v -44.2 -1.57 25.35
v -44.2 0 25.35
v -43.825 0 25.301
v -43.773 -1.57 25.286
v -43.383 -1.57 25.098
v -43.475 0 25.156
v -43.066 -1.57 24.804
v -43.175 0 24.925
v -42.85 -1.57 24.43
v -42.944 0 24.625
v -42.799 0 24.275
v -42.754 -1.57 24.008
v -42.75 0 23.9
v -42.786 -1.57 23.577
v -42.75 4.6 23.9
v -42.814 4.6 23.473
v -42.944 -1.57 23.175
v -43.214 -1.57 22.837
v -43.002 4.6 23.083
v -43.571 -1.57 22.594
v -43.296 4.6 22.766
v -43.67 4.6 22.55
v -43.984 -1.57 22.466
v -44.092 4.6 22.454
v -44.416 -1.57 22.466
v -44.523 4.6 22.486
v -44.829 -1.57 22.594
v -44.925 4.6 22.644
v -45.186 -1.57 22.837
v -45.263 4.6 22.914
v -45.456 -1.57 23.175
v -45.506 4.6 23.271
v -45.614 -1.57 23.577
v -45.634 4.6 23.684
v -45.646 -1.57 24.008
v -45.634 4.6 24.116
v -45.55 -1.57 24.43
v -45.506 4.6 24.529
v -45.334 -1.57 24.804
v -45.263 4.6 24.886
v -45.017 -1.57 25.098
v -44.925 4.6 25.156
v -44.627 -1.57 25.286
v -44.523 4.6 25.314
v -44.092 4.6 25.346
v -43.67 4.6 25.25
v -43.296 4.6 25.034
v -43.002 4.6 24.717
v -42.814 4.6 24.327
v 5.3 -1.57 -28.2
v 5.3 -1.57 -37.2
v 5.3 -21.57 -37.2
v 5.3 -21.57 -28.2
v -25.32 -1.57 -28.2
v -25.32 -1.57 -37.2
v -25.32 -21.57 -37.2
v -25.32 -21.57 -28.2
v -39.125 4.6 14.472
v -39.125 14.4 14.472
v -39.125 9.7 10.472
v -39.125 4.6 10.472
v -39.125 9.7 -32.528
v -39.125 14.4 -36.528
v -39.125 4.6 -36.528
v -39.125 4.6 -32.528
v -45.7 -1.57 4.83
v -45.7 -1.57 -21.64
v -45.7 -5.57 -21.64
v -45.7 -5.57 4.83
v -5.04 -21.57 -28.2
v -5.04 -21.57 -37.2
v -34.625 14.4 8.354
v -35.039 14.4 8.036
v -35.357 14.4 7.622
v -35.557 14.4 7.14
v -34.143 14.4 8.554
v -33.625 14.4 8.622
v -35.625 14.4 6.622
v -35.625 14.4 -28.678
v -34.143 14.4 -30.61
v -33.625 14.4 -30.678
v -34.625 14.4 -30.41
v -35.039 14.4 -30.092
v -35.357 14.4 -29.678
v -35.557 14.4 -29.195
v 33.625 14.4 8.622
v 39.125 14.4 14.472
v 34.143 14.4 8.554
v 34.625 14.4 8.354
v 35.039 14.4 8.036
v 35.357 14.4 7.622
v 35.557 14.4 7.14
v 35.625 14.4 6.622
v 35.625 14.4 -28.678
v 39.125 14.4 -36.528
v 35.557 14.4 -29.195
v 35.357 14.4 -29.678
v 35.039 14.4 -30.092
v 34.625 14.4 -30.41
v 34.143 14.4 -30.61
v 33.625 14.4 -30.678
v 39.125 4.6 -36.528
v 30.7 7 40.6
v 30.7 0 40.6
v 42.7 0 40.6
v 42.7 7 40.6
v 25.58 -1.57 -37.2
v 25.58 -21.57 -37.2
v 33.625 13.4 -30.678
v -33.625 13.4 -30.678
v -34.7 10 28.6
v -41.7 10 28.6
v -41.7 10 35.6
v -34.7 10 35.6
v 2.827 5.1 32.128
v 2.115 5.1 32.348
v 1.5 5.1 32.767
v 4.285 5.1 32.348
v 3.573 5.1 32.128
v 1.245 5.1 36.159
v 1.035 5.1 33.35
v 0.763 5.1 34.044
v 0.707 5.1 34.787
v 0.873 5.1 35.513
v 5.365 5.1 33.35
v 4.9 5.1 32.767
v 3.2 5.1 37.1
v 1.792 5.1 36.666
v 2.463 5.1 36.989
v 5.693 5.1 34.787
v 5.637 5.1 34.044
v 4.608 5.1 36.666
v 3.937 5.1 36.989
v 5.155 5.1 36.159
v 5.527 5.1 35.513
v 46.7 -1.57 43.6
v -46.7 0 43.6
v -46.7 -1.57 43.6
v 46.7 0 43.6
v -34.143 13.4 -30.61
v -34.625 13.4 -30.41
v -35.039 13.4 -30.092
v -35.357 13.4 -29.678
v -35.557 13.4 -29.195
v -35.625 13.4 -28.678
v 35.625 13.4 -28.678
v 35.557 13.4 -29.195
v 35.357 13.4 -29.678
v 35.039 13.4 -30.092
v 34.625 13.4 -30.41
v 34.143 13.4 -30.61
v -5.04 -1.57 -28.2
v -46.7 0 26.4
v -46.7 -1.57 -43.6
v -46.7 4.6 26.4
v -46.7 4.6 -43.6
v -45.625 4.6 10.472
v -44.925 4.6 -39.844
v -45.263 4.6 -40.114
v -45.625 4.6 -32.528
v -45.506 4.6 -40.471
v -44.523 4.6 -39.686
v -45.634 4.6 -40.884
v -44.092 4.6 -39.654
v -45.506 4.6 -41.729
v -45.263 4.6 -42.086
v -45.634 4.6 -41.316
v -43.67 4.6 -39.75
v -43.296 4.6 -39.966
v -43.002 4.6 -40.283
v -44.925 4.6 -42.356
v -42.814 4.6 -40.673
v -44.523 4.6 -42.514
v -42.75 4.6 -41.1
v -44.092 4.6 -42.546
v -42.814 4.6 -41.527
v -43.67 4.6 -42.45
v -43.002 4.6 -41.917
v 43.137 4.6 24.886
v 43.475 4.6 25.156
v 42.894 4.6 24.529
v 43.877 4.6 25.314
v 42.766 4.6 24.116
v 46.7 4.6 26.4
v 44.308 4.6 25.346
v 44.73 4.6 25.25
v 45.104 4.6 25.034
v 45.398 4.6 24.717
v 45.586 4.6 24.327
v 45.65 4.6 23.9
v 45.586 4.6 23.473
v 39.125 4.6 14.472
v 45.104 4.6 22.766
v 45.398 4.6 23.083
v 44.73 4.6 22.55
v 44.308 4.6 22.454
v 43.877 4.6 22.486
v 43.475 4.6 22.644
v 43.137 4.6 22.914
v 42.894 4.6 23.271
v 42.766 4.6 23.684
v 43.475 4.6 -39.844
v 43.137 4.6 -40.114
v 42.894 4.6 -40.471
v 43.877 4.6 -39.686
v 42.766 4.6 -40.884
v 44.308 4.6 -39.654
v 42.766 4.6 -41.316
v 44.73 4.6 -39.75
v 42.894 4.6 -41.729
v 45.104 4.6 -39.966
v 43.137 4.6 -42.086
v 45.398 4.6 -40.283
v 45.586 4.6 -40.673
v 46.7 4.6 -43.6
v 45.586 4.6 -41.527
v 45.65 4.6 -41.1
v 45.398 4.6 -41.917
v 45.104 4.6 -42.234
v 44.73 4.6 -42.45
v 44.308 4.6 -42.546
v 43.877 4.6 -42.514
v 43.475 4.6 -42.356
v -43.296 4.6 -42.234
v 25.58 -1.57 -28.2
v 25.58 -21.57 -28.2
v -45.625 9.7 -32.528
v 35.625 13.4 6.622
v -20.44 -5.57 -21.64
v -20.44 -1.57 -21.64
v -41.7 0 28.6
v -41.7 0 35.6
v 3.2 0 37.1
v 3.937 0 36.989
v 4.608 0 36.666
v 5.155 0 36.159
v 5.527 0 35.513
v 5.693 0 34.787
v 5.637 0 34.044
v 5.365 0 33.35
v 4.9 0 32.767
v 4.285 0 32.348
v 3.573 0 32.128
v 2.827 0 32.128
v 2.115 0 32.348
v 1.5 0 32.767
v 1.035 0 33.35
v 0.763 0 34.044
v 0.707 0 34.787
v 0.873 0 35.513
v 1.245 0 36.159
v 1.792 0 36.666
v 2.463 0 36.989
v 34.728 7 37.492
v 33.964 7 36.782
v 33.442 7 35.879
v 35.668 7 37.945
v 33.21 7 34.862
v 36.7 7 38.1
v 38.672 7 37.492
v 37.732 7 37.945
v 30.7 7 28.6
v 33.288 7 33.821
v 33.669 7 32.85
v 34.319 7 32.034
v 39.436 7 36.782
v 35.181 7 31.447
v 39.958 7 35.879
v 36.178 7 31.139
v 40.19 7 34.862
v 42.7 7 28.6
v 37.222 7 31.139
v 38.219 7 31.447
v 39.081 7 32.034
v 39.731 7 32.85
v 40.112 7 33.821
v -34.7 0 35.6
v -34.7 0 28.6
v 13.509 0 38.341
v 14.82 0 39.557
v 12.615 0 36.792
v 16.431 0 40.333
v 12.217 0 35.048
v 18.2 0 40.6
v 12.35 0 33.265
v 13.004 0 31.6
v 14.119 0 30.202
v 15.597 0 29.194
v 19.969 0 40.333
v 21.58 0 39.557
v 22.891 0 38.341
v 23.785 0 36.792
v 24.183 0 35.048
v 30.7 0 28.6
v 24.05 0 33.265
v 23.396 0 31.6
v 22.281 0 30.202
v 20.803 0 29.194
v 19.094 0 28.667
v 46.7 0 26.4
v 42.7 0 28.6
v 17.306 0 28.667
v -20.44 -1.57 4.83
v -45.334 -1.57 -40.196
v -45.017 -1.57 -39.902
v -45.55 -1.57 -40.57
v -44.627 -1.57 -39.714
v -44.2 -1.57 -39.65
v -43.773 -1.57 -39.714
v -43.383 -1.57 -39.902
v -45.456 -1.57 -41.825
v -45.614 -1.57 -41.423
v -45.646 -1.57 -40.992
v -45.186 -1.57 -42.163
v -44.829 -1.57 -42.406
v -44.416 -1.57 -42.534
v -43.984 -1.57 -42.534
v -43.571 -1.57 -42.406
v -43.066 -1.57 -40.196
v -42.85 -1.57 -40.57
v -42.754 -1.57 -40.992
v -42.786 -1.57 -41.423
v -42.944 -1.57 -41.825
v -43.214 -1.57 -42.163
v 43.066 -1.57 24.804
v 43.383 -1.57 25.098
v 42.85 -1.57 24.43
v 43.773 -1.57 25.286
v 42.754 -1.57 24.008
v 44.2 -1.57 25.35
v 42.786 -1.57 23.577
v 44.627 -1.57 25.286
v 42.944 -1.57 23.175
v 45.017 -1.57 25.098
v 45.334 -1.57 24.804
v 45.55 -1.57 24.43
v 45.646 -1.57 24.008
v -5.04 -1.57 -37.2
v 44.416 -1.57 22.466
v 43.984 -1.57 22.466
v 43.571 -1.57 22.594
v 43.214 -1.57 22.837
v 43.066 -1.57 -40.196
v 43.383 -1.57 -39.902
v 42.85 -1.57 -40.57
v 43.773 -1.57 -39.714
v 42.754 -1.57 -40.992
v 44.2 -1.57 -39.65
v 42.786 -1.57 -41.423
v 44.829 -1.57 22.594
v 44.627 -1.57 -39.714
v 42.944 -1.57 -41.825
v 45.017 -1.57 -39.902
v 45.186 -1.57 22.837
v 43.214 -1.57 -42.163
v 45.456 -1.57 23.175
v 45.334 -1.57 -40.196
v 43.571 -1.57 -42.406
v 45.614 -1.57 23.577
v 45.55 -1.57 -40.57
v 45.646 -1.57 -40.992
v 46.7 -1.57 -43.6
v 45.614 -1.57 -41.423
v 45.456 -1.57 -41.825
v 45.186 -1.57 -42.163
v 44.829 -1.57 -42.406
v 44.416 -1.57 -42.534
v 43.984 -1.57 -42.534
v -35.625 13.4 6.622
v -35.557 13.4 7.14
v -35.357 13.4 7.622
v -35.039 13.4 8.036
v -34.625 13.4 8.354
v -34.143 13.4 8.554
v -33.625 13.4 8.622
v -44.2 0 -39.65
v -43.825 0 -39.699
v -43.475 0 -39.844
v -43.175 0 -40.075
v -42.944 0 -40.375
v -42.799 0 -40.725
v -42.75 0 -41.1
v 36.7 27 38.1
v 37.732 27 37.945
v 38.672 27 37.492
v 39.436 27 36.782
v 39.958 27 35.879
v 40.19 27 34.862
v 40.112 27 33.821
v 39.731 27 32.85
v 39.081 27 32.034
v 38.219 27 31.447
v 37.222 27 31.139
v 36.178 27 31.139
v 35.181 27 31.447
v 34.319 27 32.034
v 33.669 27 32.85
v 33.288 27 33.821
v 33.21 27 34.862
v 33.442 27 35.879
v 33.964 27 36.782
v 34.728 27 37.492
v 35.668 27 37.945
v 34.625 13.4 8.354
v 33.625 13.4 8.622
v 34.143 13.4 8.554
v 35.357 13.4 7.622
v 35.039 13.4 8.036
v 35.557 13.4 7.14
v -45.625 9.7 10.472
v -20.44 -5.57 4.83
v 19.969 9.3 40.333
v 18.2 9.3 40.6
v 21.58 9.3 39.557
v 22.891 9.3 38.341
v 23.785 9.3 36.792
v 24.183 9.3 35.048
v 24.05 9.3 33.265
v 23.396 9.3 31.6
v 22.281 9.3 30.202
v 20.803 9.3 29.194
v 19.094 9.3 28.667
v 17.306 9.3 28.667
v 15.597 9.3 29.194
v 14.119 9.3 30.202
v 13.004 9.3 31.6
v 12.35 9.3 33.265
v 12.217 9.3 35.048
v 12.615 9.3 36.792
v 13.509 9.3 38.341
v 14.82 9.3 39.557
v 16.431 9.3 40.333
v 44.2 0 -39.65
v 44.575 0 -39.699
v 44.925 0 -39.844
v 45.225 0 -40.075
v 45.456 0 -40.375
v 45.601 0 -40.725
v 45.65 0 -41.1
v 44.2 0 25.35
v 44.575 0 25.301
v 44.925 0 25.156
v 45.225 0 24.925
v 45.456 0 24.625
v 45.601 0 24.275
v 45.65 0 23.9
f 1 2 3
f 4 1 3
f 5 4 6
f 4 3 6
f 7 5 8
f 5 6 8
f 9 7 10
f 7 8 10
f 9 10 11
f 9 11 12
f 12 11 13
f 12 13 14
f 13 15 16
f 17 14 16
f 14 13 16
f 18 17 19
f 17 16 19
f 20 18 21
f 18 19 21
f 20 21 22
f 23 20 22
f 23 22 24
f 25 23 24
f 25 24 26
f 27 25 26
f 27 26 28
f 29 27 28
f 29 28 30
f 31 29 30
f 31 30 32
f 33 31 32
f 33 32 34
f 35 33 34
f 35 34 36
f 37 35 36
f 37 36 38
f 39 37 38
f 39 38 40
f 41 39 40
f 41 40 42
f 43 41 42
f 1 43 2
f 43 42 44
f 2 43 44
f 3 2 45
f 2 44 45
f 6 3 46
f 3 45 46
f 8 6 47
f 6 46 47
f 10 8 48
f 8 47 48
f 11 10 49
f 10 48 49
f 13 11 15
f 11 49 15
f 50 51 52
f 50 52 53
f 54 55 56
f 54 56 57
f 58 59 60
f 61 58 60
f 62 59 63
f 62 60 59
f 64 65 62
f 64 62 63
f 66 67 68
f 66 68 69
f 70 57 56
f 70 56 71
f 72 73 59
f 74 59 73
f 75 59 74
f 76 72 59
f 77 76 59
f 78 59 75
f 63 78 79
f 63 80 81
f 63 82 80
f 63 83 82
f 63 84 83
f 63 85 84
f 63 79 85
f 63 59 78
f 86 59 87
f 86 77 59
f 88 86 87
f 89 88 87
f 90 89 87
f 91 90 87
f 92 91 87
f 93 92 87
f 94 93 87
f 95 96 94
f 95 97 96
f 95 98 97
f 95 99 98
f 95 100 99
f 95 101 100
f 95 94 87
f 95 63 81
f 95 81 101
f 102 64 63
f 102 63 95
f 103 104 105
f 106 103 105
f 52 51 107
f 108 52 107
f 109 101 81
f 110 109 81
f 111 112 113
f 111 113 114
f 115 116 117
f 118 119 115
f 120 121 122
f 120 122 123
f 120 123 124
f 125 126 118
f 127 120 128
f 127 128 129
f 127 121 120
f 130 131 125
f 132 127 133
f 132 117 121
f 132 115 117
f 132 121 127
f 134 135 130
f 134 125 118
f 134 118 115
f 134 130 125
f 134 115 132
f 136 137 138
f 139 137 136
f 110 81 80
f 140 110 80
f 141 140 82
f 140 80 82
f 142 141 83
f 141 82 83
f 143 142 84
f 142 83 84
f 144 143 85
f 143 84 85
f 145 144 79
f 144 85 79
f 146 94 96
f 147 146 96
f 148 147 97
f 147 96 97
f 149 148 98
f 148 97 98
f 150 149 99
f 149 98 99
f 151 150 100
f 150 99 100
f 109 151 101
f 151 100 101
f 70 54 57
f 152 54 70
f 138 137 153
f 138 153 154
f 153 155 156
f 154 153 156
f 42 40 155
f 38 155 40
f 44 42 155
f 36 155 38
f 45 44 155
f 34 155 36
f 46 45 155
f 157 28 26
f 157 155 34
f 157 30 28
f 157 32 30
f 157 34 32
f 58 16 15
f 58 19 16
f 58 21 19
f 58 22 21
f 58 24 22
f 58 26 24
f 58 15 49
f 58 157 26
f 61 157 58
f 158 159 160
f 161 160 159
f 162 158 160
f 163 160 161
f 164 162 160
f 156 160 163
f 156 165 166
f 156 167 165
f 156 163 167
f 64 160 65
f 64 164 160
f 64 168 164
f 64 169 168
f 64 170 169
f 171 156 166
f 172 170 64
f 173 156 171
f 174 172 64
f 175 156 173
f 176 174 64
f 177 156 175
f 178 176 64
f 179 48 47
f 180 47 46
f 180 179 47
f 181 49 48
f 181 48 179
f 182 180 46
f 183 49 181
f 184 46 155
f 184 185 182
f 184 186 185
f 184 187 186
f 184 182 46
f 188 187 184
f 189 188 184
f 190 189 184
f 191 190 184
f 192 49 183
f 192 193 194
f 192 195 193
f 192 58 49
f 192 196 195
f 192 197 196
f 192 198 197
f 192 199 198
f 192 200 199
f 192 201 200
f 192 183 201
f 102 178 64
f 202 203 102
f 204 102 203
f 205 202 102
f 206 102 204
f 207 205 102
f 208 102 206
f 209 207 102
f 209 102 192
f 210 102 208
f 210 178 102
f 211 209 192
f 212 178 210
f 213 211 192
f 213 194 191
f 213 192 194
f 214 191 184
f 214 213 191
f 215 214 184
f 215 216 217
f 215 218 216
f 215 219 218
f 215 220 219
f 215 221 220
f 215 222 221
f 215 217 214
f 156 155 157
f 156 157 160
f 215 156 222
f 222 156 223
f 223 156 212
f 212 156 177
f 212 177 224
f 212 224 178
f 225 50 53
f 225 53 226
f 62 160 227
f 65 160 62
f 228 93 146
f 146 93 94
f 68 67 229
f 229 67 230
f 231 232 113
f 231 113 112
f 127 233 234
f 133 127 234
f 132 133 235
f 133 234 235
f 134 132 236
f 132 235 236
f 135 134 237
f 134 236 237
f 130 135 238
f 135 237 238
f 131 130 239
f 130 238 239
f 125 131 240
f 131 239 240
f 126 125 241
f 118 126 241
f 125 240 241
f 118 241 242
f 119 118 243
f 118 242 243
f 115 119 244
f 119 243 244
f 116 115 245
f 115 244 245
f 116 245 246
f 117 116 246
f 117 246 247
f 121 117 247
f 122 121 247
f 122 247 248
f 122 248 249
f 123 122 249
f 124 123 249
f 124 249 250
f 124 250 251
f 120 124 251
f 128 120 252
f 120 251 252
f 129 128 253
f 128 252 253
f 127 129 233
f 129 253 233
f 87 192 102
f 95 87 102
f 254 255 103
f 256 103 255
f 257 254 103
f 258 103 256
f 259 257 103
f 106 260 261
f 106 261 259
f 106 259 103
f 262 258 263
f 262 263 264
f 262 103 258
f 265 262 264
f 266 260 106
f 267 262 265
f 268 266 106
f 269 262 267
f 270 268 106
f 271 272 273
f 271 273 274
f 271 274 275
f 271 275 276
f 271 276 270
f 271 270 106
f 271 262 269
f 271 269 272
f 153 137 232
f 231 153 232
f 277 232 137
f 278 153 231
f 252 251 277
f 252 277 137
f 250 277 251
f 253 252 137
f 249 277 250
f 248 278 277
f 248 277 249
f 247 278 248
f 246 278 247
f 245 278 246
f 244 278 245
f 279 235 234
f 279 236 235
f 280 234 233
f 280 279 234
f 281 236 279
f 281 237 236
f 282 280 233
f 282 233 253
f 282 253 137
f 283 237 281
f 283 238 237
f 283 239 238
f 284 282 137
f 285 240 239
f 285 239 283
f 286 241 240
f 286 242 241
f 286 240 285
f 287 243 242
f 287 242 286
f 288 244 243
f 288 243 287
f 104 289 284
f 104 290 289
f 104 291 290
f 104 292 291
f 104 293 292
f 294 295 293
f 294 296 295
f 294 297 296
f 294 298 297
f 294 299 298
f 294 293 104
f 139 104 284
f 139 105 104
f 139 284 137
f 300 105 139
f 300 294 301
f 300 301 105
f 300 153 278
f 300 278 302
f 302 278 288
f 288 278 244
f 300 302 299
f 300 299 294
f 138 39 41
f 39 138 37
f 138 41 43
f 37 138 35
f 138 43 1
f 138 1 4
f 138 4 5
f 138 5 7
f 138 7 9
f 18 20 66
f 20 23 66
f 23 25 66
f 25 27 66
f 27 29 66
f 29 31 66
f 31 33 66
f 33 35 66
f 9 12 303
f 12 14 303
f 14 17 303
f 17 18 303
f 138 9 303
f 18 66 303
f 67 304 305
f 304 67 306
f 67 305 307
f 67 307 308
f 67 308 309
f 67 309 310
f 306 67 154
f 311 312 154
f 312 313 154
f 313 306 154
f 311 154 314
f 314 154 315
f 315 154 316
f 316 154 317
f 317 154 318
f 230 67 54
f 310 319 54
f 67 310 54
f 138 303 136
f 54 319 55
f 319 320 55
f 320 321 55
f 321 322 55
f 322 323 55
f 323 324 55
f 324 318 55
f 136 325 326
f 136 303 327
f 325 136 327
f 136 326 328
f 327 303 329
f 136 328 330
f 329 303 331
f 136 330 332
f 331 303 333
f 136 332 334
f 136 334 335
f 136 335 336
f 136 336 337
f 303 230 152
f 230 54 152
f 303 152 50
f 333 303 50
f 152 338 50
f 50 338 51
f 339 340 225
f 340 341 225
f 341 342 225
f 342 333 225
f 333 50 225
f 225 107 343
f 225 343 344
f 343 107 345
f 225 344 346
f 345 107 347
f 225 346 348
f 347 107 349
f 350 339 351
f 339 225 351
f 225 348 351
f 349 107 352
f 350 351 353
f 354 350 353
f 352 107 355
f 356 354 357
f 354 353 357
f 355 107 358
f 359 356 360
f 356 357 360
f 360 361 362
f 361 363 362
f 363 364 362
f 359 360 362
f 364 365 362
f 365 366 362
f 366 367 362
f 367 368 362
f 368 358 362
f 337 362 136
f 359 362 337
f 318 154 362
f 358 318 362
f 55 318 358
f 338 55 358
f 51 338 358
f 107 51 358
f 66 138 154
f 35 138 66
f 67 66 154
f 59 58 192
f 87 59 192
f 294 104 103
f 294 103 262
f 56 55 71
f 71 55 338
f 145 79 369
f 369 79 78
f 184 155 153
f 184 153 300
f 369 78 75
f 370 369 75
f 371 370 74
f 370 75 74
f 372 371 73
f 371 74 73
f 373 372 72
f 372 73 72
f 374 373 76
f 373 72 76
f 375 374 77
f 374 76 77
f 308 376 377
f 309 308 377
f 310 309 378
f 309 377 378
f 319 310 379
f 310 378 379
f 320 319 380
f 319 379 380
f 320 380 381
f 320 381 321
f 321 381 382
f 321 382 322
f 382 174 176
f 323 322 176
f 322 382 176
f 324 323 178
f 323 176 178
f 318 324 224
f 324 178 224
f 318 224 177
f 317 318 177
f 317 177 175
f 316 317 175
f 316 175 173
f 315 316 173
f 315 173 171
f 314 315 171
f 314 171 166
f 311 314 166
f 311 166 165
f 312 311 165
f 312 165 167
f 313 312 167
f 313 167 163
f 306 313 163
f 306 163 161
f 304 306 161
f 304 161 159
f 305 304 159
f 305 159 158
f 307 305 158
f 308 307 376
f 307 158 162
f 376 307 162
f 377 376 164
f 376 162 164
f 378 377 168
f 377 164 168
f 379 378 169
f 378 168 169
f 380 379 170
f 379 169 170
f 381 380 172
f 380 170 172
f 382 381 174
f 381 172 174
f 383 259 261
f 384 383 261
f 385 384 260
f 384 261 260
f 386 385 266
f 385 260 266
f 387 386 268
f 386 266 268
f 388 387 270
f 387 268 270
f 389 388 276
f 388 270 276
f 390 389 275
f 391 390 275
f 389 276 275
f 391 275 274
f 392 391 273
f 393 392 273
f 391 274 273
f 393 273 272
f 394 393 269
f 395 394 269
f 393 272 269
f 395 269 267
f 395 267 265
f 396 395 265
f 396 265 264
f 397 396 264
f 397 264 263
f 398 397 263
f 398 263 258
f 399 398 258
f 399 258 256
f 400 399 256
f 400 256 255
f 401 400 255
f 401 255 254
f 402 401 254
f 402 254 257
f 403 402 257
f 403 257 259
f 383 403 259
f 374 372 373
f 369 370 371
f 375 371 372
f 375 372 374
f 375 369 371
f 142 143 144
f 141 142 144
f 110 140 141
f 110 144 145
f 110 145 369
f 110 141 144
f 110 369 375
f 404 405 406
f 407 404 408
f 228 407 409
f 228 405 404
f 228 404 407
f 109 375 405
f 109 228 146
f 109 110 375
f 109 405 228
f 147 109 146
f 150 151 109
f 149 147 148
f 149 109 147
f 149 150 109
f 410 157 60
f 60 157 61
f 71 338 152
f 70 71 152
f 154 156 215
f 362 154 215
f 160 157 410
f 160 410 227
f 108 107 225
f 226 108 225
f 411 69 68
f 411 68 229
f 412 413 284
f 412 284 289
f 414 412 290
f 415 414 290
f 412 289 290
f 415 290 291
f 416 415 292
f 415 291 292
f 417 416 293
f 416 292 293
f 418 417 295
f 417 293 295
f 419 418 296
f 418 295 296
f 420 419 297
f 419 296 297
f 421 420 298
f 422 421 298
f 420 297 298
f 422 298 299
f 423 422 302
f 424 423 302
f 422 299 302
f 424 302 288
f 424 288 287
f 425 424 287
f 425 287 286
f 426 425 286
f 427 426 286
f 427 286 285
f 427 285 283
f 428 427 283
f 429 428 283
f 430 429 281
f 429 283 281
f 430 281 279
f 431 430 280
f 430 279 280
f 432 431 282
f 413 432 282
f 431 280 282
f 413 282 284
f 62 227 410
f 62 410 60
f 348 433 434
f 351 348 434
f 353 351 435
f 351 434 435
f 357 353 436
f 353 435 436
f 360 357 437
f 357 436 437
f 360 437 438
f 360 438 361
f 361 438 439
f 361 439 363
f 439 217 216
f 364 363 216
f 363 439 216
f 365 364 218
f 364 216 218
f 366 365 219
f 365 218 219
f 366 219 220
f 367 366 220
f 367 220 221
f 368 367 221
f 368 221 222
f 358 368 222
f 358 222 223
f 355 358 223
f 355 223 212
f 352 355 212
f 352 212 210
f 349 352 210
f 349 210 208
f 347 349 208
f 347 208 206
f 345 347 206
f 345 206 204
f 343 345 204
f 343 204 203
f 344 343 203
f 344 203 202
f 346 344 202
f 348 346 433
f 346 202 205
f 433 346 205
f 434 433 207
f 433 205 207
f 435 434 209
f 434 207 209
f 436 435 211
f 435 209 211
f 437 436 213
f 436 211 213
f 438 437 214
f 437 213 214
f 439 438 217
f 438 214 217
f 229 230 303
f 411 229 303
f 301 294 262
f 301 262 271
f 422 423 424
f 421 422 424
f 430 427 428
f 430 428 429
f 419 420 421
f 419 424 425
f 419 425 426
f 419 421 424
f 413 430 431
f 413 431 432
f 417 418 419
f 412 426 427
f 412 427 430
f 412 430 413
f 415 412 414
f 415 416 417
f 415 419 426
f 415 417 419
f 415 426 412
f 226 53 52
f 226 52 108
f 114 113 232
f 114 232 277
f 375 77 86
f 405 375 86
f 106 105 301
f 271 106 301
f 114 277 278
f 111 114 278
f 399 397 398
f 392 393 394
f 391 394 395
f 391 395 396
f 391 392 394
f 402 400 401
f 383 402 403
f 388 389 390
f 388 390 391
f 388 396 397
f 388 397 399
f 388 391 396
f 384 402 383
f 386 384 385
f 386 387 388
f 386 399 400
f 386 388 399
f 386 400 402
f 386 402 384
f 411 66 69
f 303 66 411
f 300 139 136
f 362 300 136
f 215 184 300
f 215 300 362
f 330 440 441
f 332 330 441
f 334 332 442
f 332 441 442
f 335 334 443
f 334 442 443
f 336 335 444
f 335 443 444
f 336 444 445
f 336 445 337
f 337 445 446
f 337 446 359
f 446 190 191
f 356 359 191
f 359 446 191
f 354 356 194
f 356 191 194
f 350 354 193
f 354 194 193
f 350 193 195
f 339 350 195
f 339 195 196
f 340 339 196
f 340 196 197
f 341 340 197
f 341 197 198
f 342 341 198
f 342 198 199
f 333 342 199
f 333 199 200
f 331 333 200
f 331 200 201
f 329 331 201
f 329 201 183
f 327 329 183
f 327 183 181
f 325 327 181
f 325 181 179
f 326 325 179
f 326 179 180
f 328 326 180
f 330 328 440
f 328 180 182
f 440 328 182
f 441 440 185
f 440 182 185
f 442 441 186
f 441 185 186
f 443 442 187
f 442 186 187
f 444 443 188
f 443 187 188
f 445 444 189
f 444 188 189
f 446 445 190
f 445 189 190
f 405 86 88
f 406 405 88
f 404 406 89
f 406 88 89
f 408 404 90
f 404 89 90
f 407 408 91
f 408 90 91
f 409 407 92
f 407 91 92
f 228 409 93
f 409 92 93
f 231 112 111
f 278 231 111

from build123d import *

# Parameters (mm, degrees)
SKETCH1_W            = 93.4
SKETCH1_H            = 87.2
SKETCH1_R            = 1.45
BOSS_EXTRUDE2_DEPTH  = 1.57
BOSS_EXTRUDE3_START  = 4.6
SKETCH1_3_W          = 93.4
SKETCH1_3_H          = 70
SKETCH1_3_R          = 1.45
BOSS_EXTRUDE3_DEPTH  = 4.6
SKETCH1_4_W          = 78.25
SKETCH1_4_H          = 51
BOSS_EXTRUDE4_DEPTH  = 14.4
SKETCH1_5_W          = 6.5
SKETCH1_5_H          = 43
BOSS_EXTRUDE5_DEPTH  = 9.7
SKETCH1_6_W          = 12
SKETCH1_6_H          = 12
BOSS_EXTRUDE6_DEPTH  = 7
SKETCH1_7_R          = 3.5
BOSS_EXTRUDE7_DEPTH  = 27
SKETCH1_8_R          = 6
BOSS_EXTRUDE8_DEPTH  = 9.3
SKETCH1_9_R          = 2.5
BOSS_EXTRUDE9_DEPTH  = 5.1
SKETCH3_W            = 26.26
SKETCH3_H            = 26.47
BOSS_EXTRUDE10_DEPTH = 4
SKETCH4_W            = 20.28
SKETCH4_H            = 9
BOSS_EXTRUDE11_DEPTH = 20
CUT_EXTRUDE1_DEPTH   = 1
SKETCH6_W            = 26.47
SKETCH6_H            = 4
CUT_EXTRUDE2_DEPTH   = 1
SKETCH7_W            = 7
SKETCH7_H            = 7
BOSS_EXTRUDE12_DEPTH = 10


with BuildPart() as part:
    # Sketch1 → Boss-Extrude2 (new body)
    with BuildSketch(Plane(origin=(0, 0, 0), x_dir=(1, 0, 0), z_dir=(0, 1, 0))):
        Rectangle(SKETCH1_W, SKETCH1_H)
        with Locations((-44.2, -23.9)):
            Circle(SKETCH1_R, mode=Mode.SUBTRACT)
        with Locations((44.2, -23.9)):
            Circle(SKETCH1_R, mode=Mode.SUBTRACT)
        with Locations((-44.2, 41.1)):
            Circle(SKETCH1_R, mode=Mode.SUBTRACT)
        with Locations((44.2, 41.1)):
            Circle(SKETCH1_R, mode=Mode.SUBTRACT)
    extrude(amount=-BOSS_EXTRUDE2_DEPTH)

    # Sketch1<3> → Boss-Extrude3 (add)
    with BuildSketch(Plane(origin=(0, 0, 0), x_dir=(1, 0, 0), z_dir=(0, 1, 0)).offset(BOSS_EXTRUDE3_START)):
        with Locations((0, 8.6)):
            Rectangle(SKETCH1_3_W, SKETCH1_3_H)
        with Locations((-44.2, -23.9)):
            Circle(SKETCH1_3_R, mode=Mode.SUBTRACT)
        with Locations((44.2, -23.9)):
            Circle(SKETCH1_3_R, mode=Mode.SUBTRACT)
        with Locations((-44.2, 41.1)):
            Circle(SKETCH1_3_R, mode=Mode.SUBTRACT)
        with Locations((44.2, 41.1)):
            Circle(SKETCH1_3_R, mode=Mode.SUBTRACT)
    extrude(amount=-BOSS_EXTRUDE3_DEPTH)

    # Sketch1<4> → Boss-Extrude4 (add)
    with BuildSketch(Plane(origin=(0, 0, 0), x_dir=(1, 0, 0), z_dir=(0, 1, 0))):
        with Locations((0, 11.027837259)):
            Rectangle(SKETCH1_4_W, SKETCH1_4_H)
    extrude(amount=BOSS_EXTRUDE4_DEPTH)

    # Sketch1<5> → Boss-Extrude5 (add)
    with BuildSketch(Plane(origin=(0, 0, 0), x_dir=(1, 0, 0), z_dir=(0, 1, 0))):
        with Locations((-42.375, 11.027837259)):
            Rectangle(SKETCH1_5_W, SKETCH1_5_H)
    extrude(amount=BOSS_EXTRUDE5_DEPTH)

    # Sketch1<6> → Boss-Extrude6 (add)
    with BuildSketch(Plane(origin=(0, 0, 0), x_dir=(1, 0, 0), z_dir=(0, 1, 0))):
        with Locations((36.7, -34.6)):
            Rectangle(SKETCH1_6_W, SKETCH1_6_H)
    extrude(amount=BOSS_EXTRUDE6_DEPTH)

    # Sketch1<7> → Boss-Extrude7 (add)
    with BuildSketch(Plane(origin=(0, 0, 0), x_dir=(1, 0, 0), z_dir=(0, 1, 0))):
        with Locations((36.7, -34.6)):
            Circle(SKETCH1_7_R)
    extrude(amount=BOSS_EXTRUDE7_DEPTH)

    # Sketch1<8> → Boss-Extrude8 (add)
    with BuildSketch(Plane(origin=(0, 0, 0), x_dir=(1, 0, 0), z_dir=(0, 1, 0))):
        with Locations((18.2, -34.6)):
            Circle(SKETCH1_8_R)
    extrude(amount=BOSS_EXTRUDE8_DEPTH)

    # Sketch1<9> → Boss-Extrude9 (add)
    with BuildSketch(Plane(origin=(0, 0, 0), x_dir=(1, 0, 0), z_dir=(0, 1, 0))):
        with Locations((3.2, -34.6)):
            Circle(SKETCH1_9_R)
    extrude(amount=BOSS_EXTRUDE9_DEPTH)

    # Sketch3 → Boss-Extrude10 (add)
    with BuildSketch(Plane.XZ.offset(1.57)):
        with Locations((-33.57, -8.405)):
            Rectangle(SKETCH3_W, SKETCH3_H)
    extrude(amount=BOSS_EXTRUDE10_DEPTH)

    # Sketch4 → Boss-Extrude11 (add)
    with BuildSketch(Plane.XZ.offset(1.57)):
        with Locations((-15.18, -32.7)):
            Rectangle(SKETCH4_W, SKETCH4_H)
        with Locations((15.44, -32.7)):
            Rectangle(SKETCH4_W, SKETCH4_H)
    extrude(amount=BOSS_EXTRUDE11_DEPTH)

    # Sketch5 → Cut-Extrude1 (cut)
    with BuildSketch(Plane(origin=(0, 14.4, 0), x_dir=(1, 0, 0), z_dir=(0, 1, 0))):
        with BuildLine():
            Line((33.625, 30.677837259), (-33.625, 30.677837259))
            ThreePointArc((-33.625, 30.677837259), (-35.039213562, 30.092050821), (-35.625, 28.677837259))
            Line((-35.625, 28.677837259), (-35.625, -6.622162741))
            ThreePointArc((-35.625, -6.622162741), (-35.039213562, -8.036376303), (-33.625, -8.622162741))
            Line((-33.625, -8.622162741), (33.625, -8.622162741))
            ThreePointArc((33.625, -8.622162741), (35.039213562, -8.036376303), (35.625, -6.622162741))
            Line((35.625, -6.622162741), (35.625, 28.677837259))
            ThreePointArc((35.625, 28.677837259), (35.039213562, 30.092050821), (33.625, 30.677837259))
        make_face()
    extrude(amount=-CUT_EXTRUDE1_DEPTH, mode=Mode.SUBTRACT)

    # Sketch6 → Cut-Extrude2 (cut)
    with BuildSketch(Plane.ZY.offset(46.7)):
        with Locations((-8.405, -3.57)):
            Rectangle(SKETCH6_W, SKETCH6_H)
    extrude(amount=-CUT_EXTRUDE2_DEPTH, mode=Mode.SUBTRACT)

    # Sketch7 → Boss-Extrude12 (add)
    with BuildSketch(Plane(origin=(0, 0, 0), x_dir=(1, 0, 0), z_dir=(0, 1, 0))):
        with Locations((-38.2, -32.1)):
            Rectangle(SKETCH7_W, SKETCH7_H)
    extrude(amount=BOSS_EXTRUDE12_DEPTH)


solid = part.part
